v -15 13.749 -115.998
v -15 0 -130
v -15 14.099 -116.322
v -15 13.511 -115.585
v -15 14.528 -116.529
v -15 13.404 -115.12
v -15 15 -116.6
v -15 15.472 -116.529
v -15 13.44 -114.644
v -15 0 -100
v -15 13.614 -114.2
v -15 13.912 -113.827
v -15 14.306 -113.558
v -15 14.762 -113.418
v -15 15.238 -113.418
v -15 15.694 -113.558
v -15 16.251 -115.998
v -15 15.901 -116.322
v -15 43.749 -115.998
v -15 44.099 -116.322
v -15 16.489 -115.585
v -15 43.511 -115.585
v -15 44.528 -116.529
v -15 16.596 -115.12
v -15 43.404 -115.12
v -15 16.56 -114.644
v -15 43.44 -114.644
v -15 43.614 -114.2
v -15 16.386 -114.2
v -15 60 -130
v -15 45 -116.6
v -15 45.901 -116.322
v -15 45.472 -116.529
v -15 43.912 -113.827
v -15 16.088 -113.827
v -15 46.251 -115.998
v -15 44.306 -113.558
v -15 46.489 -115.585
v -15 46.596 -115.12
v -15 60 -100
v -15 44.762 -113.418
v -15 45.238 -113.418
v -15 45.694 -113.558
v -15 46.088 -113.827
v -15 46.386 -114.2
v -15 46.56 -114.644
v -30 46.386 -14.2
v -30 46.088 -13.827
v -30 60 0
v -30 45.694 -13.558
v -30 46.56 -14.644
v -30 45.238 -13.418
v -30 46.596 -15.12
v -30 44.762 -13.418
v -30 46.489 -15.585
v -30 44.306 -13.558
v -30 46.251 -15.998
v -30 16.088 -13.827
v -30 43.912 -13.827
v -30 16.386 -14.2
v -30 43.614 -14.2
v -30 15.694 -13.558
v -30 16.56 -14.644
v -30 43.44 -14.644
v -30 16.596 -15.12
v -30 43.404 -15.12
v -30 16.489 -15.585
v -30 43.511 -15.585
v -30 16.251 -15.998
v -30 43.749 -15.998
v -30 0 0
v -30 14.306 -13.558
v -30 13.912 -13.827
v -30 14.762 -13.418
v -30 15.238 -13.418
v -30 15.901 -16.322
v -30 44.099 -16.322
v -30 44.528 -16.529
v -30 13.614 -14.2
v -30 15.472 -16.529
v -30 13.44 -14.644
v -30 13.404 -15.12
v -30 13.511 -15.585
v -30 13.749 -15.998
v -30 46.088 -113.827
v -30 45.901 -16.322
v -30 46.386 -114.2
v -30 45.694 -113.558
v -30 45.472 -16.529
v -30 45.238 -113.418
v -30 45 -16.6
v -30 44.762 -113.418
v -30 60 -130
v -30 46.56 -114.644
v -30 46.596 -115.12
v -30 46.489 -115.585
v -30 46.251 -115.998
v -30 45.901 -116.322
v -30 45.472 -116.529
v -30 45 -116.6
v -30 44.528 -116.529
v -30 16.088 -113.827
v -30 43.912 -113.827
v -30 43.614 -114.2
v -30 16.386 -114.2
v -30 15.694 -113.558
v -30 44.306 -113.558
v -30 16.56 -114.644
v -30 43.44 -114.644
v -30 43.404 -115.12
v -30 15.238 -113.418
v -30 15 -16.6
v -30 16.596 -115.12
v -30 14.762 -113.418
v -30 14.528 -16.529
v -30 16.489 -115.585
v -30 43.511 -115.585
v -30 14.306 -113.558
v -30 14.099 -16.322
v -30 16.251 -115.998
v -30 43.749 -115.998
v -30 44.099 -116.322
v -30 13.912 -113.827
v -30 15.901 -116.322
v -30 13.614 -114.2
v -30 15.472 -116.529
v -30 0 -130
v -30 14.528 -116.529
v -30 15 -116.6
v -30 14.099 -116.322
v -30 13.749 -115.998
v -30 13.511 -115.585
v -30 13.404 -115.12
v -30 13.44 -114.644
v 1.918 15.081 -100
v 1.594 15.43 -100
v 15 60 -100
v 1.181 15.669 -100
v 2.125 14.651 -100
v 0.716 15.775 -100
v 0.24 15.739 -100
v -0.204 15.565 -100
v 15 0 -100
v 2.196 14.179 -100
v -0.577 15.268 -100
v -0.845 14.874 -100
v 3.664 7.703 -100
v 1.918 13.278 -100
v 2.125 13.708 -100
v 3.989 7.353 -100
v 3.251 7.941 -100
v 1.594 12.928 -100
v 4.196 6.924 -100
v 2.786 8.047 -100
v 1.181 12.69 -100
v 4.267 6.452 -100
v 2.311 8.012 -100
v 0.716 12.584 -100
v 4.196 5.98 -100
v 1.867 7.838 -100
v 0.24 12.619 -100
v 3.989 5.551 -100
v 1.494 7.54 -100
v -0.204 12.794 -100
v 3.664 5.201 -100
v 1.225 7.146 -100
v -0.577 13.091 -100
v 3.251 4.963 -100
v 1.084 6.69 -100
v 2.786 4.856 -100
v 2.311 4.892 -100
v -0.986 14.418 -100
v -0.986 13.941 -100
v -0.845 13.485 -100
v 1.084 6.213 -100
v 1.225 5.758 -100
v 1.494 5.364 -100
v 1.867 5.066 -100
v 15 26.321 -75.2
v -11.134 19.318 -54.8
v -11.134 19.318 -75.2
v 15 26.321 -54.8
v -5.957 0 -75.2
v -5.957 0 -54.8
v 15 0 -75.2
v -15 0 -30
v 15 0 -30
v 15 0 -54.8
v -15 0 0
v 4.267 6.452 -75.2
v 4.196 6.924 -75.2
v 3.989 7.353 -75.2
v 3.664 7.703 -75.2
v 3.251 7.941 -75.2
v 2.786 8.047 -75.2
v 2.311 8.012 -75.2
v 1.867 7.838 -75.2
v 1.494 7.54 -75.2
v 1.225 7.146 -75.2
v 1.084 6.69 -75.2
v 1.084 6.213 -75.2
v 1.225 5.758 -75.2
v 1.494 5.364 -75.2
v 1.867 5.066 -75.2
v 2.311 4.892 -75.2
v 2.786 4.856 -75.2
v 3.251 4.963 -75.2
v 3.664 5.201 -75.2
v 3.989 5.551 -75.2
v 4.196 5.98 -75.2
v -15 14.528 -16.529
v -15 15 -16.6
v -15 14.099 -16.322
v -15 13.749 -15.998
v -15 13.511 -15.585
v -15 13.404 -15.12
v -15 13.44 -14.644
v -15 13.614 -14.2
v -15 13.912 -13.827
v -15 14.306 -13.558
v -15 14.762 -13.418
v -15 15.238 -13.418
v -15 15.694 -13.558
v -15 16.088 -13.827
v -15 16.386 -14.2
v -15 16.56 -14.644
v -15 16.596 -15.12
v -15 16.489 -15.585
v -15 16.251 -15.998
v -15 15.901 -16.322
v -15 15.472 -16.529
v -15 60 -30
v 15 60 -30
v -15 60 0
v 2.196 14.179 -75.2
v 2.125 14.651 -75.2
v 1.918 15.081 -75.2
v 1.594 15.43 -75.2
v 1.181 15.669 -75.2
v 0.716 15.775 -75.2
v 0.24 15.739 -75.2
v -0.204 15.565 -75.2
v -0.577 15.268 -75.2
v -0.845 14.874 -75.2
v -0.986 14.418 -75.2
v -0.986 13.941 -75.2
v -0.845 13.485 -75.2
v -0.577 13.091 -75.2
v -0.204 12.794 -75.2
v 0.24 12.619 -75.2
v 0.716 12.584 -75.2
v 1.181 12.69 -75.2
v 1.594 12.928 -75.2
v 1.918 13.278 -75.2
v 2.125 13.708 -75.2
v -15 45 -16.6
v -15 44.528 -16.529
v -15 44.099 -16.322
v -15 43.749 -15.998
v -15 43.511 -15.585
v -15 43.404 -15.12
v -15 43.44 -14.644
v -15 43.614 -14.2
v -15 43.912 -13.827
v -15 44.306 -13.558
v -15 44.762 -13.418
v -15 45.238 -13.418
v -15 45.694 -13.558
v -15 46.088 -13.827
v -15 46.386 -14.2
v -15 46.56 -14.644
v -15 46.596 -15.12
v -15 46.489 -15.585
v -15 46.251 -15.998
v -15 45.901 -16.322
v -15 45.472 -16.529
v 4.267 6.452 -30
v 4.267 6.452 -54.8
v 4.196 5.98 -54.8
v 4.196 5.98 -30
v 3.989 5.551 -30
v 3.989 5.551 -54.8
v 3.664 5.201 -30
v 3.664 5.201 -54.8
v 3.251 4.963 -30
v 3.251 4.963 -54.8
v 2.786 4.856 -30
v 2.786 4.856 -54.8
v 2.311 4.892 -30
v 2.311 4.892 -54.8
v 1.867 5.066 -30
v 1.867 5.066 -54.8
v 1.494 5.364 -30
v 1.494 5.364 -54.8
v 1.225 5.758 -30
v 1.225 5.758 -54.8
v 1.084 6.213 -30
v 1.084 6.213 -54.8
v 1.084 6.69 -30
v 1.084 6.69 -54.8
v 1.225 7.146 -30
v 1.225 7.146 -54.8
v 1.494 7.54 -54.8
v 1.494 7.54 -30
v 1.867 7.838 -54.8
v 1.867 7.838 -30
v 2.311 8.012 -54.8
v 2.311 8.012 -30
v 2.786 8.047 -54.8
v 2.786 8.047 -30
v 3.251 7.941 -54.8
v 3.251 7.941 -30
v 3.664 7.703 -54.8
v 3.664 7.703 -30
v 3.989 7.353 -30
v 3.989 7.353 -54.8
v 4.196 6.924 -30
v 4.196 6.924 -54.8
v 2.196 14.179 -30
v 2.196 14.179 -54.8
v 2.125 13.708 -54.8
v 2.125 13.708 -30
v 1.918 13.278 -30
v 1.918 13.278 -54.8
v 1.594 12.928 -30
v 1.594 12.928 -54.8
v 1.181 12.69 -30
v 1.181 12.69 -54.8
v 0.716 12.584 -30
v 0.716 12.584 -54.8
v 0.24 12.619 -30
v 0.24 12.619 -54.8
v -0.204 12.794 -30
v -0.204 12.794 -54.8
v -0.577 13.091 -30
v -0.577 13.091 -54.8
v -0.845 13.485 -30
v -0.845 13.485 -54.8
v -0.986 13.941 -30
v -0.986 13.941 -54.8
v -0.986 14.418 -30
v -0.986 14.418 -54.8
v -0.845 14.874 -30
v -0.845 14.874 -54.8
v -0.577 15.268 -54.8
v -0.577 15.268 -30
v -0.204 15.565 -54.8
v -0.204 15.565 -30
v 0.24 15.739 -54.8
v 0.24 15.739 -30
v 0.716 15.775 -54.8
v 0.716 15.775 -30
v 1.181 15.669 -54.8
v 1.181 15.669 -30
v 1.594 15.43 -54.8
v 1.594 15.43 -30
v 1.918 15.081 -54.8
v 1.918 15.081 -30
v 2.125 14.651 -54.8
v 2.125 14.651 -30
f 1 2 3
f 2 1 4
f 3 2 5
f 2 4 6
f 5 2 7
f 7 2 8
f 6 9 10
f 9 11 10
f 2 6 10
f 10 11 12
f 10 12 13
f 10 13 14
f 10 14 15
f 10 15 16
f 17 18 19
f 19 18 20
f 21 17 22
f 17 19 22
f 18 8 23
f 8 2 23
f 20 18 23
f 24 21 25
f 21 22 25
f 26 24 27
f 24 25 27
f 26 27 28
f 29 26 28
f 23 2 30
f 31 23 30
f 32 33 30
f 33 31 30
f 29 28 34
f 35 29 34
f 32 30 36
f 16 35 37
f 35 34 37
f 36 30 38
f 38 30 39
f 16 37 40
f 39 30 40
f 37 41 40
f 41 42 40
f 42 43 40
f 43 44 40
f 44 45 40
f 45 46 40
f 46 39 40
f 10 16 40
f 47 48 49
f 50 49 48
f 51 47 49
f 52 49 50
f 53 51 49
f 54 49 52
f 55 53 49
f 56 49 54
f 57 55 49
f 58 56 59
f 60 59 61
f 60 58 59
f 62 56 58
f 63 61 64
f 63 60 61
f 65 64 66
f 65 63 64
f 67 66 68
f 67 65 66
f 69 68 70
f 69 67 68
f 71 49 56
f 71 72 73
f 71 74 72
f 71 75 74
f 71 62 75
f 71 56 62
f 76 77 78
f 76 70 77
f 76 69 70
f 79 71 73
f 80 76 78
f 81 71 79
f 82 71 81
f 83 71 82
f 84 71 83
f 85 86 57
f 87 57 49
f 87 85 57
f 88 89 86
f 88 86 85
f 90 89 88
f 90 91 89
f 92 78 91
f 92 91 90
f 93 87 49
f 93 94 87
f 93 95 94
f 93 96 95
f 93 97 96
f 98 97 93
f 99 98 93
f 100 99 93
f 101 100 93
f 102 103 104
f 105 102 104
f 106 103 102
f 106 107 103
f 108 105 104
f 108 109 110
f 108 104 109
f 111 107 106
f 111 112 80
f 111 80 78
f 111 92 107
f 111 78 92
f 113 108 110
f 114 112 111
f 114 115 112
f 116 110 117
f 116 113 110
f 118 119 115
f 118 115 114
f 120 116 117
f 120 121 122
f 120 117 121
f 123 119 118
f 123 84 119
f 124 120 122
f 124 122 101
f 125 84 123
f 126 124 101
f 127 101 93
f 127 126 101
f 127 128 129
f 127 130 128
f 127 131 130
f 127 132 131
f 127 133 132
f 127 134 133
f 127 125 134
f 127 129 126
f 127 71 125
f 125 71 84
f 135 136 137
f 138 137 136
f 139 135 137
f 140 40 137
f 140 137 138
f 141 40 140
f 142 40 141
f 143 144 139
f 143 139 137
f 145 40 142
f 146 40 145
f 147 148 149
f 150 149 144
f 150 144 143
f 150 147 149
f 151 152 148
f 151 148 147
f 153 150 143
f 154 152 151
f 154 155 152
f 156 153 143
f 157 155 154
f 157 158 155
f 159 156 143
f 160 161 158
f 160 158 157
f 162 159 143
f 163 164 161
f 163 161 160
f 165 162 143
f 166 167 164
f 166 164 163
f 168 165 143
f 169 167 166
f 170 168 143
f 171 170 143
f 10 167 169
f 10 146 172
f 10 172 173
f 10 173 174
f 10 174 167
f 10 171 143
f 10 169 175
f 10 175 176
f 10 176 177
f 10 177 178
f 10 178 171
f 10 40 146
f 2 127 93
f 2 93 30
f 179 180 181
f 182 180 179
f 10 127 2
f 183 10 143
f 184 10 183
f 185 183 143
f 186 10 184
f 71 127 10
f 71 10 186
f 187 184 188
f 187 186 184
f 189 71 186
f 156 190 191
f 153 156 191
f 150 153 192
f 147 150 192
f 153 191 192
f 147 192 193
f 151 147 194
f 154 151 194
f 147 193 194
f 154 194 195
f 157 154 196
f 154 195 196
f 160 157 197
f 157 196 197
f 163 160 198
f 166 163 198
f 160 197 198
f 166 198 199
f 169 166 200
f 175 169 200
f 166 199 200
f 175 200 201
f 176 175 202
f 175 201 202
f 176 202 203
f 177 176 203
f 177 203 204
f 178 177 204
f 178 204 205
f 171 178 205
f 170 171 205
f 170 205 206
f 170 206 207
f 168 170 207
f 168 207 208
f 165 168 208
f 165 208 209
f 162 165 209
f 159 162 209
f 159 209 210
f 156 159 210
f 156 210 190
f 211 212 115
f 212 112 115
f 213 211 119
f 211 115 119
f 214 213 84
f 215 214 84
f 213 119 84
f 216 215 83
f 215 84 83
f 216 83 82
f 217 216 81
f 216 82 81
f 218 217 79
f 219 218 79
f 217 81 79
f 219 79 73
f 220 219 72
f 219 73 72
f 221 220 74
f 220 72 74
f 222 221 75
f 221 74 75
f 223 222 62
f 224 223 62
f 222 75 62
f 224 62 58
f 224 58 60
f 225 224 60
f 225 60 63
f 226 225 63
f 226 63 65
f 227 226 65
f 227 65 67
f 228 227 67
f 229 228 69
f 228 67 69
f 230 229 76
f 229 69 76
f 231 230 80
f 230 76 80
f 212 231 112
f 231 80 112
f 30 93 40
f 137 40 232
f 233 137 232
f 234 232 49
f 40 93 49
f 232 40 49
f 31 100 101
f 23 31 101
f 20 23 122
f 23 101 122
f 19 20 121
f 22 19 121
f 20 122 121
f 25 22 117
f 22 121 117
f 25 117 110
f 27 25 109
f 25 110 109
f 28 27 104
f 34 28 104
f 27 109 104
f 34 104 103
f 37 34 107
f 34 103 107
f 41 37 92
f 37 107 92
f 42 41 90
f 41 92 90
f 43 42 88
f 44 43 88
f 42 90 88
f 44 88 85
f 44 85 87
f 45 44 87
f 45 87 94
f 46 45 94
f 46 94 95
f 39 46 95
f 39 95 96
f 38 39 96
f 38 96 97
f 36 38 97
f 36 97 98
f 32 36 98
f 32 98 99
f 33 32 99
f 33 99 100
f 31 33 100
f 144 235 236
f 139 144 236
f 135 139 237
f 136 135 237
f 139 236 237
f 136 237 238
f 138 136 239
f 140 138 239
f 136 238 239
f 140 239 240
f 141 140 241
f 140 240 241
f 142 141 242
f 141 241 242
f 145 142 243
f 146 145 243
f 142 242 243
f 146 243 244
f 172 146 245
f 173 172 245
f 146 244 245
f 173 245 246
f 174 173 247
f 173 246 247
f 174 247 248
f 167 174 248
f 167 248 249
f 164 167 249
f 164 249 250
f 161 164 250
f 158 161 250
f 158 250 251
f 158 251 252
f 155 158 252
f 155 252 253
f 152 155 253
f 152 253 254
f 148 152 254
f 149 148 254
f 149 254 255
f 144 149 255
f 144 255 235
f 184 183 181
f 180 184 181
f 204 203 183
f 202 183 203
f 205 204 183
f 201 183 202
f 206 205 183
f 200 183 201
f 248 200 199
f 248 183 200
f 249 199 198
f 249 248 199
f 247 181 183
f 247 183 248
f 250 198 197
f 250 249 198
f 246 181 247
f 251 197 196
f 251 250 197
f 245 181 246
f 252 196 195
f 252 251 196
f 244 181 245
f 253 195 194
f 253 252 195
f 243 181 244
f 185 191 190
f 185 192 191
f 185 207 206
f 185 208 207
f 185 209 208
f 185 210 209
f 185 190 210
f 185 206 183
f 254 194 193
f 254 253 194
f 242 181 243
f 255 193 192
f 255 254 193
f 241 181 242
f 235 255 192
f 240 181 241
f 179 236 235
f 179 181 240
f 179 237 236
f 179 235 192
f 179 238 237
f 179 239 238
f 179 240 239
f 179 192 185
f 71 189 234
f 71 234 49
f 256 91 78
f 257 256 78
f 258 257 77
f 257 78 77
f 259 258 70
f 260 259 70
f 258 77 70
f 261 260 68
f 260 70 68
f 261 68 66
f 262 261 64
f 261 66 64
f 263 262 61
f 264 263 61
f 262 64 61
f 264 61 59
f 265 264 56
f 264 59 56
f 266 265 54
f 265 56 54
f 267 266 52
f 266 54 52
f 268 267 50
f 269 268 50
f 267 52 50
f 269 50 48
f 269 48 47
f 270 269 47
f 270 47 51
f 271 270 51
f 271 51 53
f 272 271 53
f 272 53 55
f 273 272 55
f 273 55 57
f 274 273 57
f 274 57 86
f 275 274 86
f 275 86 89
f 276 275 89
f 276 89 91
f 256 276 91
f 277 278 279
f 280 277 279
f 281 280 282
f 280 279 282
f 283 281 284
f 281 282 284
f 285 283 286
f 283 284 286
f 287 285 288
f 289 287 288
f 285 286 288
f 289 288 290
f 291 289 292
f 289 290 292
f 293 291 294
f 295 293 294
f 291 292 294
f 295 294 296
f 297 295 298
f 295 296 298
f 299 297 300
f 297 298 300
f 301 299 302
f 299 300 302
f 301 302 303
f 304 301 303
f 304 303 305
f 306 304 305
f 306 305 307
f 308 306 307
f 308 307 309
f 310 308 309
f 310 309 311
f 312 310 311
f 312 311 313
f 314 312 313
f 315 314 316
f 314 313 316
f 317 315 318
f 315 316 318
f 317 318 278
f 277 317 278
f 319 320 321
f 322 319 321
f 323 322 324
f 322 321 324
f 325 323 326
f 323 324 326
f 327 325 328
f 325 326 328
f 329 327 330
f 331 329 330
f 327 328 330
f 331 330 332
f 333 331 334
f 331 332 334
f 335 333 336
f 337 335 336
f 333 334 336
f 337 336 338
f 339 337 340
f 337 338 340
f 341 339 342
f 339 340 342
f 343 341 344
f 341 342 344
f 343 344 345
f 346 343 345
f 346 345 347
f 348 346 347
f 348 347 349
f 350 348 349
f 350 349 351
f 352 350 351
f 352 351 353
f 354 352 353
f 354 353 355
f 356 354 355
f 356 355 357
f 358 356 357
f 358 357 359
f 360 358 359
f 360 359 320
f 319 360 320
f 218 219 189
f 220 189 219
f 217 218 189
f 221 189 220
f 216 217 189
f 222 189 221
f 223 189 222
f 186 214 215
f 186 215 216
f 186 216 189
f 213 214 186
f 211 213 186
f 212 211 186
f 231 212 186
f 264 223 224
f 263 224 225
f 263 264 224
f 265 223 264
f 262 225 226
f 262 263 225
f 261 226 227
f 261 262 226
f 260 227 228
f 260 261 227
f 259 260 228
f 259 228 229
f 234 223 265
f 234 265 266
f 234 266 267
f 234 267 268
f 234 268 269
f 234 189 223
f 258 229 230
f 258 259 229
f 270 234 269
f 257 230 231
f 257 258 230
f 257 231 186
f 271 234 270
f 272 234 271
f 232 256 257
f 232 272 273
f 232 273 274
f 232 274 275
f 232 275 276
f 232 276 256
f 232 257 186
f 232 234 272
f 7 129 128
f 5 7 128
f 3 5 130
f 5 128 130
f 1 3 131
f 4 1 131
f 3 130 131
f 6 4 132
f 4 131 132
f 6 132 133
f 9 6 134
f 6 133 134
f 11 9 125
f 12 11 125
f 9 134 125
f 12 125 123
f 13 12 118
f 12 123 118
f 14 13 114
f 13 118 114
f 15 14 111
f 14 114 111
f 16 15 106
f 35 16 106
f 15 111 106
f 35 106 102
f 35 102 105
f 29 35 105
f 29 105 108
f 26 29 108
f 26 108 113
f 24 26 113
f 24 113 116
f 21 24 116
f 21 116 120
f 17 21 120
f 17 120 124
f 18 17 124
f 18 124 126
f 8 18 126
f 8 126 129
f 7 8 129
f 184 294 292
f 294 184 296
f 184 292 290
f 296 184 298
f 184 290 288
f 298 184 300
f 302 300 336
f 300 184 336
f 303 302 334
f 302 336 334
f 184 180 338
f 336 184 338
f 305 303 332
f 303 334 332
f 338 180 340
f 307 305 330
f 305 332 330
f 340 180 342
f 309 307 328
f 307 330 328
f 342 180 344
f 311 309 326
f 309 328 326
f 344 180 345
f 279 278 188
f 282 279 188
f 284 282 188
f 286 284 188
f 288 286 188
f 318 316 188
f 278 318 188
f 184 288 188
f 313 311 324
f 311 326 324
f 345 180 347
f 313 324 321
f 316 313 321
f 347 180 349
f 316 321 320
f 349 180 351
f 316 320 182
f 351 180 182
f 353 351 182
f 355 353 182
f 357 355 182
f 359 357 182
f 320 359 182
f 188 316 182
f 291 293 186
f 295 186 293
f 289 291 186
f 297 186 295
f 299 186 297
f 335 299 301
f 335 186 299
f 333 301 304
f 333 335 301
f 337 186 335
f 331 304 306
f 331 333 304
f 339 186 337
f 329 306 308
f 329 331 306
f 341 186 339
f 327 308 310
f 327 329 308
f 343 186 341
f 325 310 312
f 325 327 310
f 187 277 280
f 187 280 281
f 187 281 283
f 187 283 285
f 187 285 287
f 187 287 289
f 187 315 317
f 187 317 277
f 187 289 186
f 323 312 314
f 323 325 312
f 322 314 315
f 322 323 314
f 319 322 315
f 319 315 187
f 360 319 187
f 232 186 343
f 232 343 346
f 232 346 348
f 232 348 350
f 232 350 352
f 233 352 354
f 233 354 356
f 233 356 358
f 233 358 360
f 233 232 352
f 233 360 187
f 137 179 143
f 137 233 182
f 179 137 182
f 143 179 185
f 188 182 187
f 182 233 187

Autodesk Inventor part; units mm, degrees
ref_plane "YZ Plane" through (0, 0, 0) normal (1, 0, 0) x (0, 1, 0)
ref_plane "XZ Plane" through (0, 0, 0) normal (0, 1, 0) x (-1, 0, 0)
ref_plane "XY Plane" through (0, 0, 0) normal (0, 0, 1) x (1, 0, 0)
sketch "スケッチ1" plane through (0, 0, 0) normal (0, 1, 0) x (-1, 0, 0)
  line L0 (0, 0) -> (30, 0)
  line L1 (30, 0) -> (30, -130)
  line L2 (30, -130) -> (0, -130)
  line L3 (0, -130) -> (0, 0)
  dimension "d0" = 30
  dimension "d1" = 130
extrude "押し出し1" add sketch "スケッチ1" along normal blind 60
sketch "スケッチ2" plane through (0, 60, 0) normal (0, 1, 0) x (1, 0, 0)
  line L0 (-30, 0) -> (0, 0) projected
  line L1 (0, 0) -> (-15, 0)
  line L2 (-15, 0) -> (-15, 30)
  line L3 (-15, 30) -> (0, 30)
  line L4 (0, 30) -> (0, 0)
  line L5 (0, 130) -> (-30, 130) projected
  line L6 (0, 130) -> (-15, 130)
  line L7 (-15, 130) -> (-15, 100)
  line L8 (-15, 100) -> (0, 100)
  line L9 (0, 100) -> (0, 130)
  dimension "d4" = 15
  dimension "d5" = 30
  dimension "d6" = 15
  dimension "d7" = 30
extrude "押し出し2" cut sketch "スケッチ2" against normal blind 60
sketch "スケッチ4" plane through (0, 0, -30) normal (1, 0, 0) x (0, 0, -1)
  line L0 (0, 0) -> (70, 0) projected
  line L1 (70, 60) -> (70, 0) projected
  line L2 (0, 0) -> (70, 0)
  line L3 (70, 0) -> (70, 60)
  line L4 (70, 60) -> (0, 60)
  line L5 (0, 60) -> (0, 0)
  point P0 (-30, 0)
extrude "押し出し3" add sketch "スケッチ4" along normal blind 15
sketch "スケッチ5" plane through (-15, 0, -30) normal (0, 0, 1) x (1, 0, 0)
  line L0 (30, 0) -> (0, 0) projected
  line L1 (9.0427, 0) -> (3.8663, 19.3185)
  line L2 (9.0427, 0) -> (29.0427, 0) construction
  line L3 (3.8663, 19.3185) -> (30, 26.321)
  line L4 (30, 26.321) -> (30, 0)
  line L5 (30, 0) -> (9.0427, 0)
  point P0 (15, 0)
  dimension "d15" = 20
  dimension "d16" = 105
extrude "押し出し4" cut sketch "スケッチ5" against normal blind 45.2
sketch "スケッチ6" plane through (-15, 0, -30) normal (0, 0, 1) x (1, 0, 0)
  line L0 (9.0427, 0) -> (3.8663, 19.3185) projected
  line L1 (3.8663, 19.3185) -> (9.0427, 0)
  line L2 (0, 0) -> (30, 0) projected
  line L3 (9.0427, 0) -> (30, 0)
  line L4 (30, 26.321) -> (30, 0) projected
  line L5 (30, 0) -> (30, 26.321)
  line L6 (30, 26.321) -> (3.8663, 19.3185)
  point P0 (15, 0)
extrude "押し出し5" add sketch "スケッチ6" against normal blind 24.8
sketch "スケッチ7" plane through (-15, 0, -30) normal (0, 0, 1) x (1, 0, 0)
  point P0 (15, 0)
sketch "スケッチ8" plane through (-15, 0, -75.2) normal (0, 0, 1) x (1, 0, 0)
  line L0 (9.0427, 0) -> (3.8663, 19.3185) projected
  line L1 (3.8663, 19.3185) -> (30, 26.321) projected
  circle A0 centre (15.5961, 14.1793) radius 1.6
  circle A1 centre (17.6666, 6.4519) radius 1.6
  point P0 (15, 0)
  dimension "d21" = 10
  dimension "d22" = 8
  dimension "d23" = 10
  dimension "d24" = 16
  dimension "d25" = 3.2
  dimension "d26" = 3.2
extrude "押し出し6" cut sketch "スケッチ8" along normal mid plane 100
sketch "スケッチ9" plane through (-15, 60, 0) normal (1, 0, 0) x (0, 0, -1)
  line L0 (0, 0) -> (30, 0) projected
  line L1 (0, -60) -> (0, 0) projected
  line L2 (100, 0) -> (130, 0) projected
  line L3 (130, 0) -> (130, -60) projected
  point P0 (15, -15)
  point P1 (15, -45)
  point P2 (115, -15)
  point P3 (115, -45)
  dimension "d29" = 15
  dimension "d30" = 15
  dimension "d31" = 15
  dimension "d32" = 45
  dimension "d33" = 15
  dimension "d34" = 15
  dimension "d35" = 30
  dimension "d36" = 15
hole "穴1" at (-15, 45, -15) at (-15, 15, -15) at (-15, 45, -115) at (-15, 15, -115) direction (-1, 0, 0) diameter 3.2 end through all
properties part number "ハンド_簡易4"
